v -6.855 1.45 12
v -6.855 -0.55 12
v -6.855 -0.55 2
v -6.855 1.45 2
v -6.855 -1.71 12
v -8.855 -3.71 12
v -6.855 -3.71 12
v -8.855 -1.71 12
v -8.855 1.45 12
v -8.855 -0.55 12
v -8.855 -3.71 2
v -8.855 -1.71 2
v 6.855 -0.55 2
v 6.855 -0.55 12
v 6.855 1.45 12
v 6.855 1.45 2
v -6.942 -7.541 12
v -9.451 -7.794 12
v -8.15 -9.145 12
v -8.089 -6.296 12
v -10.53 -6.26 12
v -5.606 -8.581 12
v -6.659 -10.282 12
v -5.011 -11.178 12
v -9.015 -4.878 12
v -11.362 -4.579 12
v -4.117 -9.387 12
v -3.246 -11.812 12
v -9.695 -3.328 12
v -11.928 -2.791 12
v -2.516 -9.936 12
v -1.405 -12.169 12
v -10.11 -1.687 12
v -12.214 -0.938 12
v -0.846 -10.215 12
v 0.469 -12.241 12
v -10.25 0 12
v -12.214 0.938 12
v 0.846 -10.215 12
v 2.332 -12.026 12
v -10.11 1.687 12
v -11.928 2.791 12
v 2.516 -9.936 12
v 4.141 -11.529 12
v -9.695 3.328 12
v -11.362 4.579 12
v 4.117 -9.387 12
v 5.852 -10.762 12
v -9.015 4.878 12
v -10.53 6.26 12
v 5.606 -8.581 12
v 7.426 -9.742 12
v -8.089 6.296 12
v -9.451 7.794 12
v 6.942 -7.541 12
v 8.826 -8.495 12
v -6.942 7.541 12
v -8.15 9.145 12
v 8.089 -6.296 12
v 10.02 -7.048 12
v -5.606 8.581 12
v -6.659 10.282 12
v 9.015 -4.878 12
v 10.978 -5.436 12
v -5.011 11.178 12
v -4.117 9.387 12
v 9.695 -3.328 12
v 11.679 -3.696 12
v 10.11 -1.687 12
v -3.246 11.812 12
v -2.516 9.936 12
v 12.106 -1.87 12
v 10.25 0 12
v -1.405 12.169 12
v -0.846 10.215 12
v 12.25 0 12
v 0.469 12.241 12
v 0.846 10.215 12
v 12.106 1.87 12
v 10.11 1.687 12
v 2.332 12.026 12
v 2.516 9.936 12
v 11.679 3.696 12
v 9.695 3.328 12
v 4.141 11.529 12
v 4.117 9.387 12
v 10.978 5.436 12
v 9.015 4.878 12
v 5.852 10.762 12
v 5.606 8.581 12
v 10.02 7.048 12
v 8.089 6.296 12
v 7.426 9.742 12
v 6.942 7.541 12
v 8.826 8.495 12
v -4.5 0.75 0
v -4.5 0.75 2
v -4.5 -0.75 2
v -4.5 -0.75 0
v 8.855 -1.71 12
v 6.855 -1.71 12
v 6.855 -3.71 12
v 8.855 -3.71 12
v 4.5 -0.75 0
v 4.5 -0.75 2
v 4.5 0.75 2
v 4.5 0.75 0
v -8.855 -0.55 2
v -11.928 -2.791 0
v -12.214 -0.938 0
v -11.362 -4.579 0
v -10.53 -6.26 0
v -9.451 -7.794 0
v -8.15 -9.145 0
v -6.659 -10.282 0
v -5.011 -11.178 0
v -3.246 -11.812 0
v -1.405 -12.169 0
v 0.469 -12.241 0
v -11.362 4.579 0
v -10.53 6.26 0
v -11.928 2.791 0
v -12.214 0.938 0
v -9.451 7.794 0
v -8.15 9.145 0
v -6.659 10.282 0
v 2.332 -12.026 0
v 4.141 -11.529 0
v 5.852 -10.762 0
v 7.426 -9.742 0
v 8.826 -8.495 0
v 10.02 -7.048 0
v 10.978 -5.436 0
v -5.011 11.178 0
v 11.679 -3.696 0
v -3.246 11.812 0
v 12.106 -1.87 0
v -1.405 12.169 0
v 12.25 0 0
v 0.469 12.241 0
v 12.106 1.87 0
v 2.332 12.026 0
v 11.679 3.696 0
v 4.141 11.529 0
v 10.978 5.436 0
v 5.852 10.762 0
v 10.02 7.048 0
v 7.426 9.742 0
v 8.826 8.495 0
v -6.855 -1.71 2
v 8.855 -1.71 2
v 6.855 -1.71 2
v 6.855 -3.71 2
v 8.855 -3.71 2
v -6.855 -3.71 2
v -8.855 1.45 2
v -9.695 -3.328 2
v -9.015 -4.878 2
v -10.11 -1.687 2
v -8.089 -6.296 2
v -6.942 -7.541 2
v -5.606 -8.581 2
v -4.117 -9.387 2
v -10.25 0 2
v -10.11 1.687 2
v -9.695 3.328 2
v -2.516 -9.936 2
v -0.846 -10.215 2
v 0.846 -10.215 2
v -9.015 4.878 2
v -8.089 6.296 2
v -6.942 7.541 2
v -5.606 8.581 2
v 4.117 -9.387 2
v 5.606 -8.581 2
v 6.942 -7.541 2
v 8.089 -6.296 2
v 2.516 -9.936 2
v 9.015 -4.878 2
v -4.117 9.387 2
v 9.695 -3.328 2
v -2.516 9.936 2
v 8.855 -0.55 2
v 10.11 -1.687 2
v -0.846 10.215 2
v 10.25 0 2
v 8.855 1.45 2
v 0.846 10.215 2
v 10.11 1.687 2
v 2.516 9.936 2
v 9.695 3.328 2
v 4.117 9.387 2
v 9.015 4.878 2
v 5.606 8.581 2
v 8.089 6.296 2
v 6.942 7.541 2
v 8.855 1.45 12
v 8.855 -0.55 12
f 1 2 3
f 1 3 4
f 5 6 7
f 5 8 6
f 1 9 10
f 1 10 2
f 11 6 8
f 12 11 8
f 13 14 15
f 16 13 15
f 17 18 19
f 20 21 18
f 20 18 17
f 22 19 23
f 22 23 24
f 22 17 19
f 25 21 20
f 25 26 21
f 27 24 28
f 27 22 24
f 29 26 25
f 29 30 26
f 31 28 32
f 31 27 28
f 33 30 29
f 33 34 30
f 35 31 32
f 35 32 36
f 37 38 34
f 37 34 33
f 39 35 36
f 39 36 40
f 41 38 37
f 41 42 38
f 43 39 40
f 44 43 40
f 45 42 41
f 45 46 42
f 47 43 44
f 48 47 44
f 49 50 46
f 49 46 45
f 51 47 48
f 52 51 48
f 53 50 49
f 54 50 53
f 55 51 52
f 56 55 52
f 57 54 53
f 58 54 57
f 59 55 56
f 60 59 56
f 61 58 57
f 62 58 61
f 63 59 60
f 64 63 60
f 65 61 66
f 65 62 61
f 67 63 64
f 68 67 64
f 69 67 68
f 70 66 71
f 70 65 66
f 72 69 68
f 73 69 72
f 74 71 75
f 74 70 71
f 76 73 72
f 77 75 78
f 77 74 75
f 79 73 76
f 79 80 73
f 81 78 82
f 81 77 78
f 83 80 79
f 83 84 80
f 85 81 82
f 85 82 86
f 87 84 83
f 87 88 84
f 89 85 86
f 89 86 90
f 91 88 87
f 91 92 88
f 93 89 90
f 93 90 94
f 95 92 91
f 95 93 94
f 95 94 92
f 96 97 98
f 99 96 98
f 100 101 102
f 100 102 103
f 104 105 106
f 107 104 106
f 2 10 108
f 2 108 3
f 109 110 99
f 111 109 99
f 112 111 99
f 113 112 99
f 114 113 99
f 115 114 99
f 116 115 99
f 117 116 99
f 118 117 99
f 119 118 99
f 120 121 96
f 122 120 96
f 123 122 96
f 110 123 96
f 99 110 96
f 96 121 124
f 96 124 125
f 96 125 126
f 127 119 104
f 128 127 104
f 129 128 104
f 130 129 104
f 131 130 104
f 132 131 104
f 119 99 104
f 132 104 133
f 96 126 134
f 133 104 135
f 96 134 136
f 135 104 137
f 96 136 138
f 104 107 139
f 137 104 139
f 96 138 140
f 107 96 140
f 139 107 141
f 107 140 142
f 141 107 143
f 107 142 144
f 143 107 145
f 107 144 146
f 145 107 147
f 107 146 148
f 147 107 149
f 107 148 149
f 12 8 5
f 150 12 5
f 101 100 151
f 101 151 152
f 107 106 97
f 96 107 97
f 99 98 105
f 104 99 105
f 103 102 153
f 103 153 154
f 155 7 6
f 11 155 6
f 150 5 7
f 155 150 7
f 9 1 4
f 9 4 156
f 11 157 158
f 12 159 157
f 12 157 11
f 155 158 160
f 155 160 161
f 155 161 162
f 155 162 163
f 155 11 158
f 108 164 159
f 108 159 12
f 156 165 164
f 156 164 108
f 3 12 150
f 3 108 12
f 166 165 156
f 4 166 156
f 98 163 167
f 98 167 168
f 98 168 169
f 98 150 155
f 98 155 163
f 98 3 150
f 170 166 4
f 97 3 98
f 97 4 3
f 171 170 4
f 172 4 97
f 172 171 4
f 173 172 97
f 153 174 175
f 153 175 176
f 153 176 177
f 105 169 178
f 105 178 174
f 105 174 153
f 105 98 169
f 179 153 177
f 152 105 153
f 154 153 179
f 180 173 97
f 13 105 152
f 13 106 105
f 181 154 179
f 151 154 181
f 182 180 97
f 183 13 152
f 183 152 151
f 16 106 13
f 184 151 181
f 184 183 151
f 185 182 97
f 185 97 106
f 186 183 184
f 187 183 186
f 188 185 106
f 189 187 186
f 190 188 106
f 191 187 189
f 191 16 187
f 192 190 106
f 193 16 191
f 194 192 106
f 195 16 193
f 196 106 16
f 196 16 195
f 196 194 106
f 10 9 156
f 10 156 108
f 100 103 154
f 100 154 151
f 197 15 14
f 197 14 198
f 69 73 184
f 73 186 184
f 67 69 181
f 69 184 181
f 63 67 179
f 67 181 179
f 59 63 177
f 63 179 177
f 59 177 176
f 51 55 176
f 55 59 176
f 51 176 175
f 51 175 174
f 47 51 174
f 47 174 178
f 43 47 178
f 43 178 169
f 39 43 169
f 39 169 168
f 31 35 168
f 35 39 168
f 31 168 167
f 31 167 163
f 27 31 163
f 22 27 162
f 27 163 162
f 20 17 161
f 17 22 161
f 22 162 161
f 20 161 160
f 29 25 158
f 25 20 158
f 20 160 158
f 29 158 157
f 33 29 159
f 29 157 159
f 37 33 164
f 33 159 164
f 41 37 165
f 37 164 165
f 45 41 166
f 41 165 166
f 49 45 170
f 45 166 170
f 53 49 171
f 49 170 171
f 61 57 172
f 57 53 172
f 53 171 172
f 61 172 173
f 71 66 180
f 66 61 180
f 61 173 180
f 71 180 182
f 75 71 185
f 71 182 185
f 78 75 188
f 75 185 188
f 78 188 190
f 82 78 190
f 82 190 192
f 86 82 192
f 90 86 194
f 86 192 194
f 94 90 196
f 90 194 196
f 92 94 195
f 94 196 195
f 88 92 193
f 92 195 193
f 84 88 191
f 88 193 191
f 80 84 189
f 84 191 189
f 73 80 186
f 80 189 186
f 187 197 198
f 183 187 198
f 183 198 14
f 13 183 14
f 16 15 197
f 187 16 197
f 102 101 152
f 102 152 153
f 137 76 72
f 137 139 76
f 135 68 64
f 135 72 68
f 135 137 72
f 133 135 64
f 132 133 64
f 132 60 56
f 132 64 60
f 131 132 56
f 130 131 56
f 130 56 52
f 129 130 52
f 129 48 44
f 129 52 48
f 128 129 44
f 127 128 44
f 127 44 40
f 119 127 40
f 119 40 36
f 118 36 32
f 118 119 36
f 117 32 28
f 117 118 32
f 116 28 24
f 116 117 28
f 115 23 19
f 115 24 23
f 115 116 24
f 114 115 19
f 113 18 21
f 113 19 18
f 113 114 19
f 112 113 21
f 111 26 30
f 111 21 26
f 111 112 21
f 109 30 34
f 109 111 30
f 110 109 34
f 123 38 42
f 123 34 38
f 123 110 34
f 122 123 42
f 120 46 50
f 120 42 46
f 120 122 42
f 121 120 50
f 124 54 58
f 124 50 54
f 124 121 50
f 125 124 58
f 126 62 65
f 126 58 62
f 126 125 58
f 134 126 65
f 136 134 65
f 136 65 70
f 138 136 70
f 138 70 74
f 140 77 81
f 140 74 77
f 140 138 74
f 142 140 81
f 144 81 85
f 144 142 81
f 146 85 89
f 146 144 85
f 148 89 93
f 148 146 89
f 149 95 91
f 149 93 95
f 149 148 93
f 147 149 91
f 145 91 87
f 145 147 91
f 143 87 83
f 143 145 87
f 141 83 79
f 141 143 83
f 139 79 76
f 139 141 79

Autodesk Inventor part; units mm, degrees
ref_plane "YZ Plane" through (0, 0, 0) normal (1, 0, 0) x (0, 1, 0)
ref_plane "XZ Plane" through (0, 0, 0) normal (0, 1, 0) x (-1, 0, 0)
ref_plane "XY Plane" through (0, 0, 0) normal (0, 0, 1) x (1, 0, 0)
sketch "Sketch1" plane through (0, 0, 0) normal (0, 0, 1) x (1, 0, 0)
  circle A0 centre (0, 0) radius 12.25 projected
  point P0 (0, 0)
extrude "Extrusion1" add sketch "Sketch1" along normal blind 2
sketch "Sketch2" plane through (0, 0, 2) normal (0, 0, 1) x (1, 0, 0)
  circle A0 centre (0, 0) radius 12.25 projected
  line L0 (-4.5, -0.75) -> (4.5, -0.75)
  line L1 (4.5, -0.75) -> (4.5, 0.75)
  line L2 (4.5, 0.75) -> (-4.5, 0.75)
  line L3 (-4.5, 0.75) -> (-4.5, -0.75)
  line L4 (-4.5, -0.75) -> (4.5, 0.75) construction
  line L5 (4.5, -0.75) -> (-4.5, 0.75) construction
  dimension "d13" = 9
  dimension "d14" = 1.5
extrude "Extrusion2" cut sketch "Sketch2" against normal through all contours L3 L2 L1 L0
sketch "Sketch3" plane through (0, 0, 2) normal (0, 0, 1) x (1, 0, 0)
  circle A0 centre (0, 0) radius 12.25 projected
  circle A1 centre (0, 0) radius 10.25
  dimension "d4" = 2
extrude "Extrusion3" add sketch "Sketch3" along normal blind 10
sketch "Sketch4" plane through (0, 0, 2) normal (0, 0, 1) x (1, 0, 0)
  circle A0 centre (0, 0) radius 10.25 construction
  line L0 (-5.235, -0.75) -> (-8.355, -0.75) construction
  line L1 (-5.235, -1.51) -> (-8.355, -1.51) construction
  line L2 (-8.355, -0.75) -> (-8.355, -1.51) projected
  line L3 (-8.855, -0.55) -> (-6.855, -0.55)
  line L4 (-6.855, -0.55) -> (-6.855, 1.45)
  line L5 (-6.855, 1.45) -> (-8.855, 1.45)
  line L6 (-8.855, 1.45) -> (-8.855, -0.55)
  line L7 (-8.855, -0.55) -> (-6.855, 1.45) construction
  line L8 (-6.855, -0.55) -> (-8.855, 1.45) construction
  line L9 (-8.355, -1.13) -> (-6.0393, -1.13) construction
  line L10 (-8.855, -1.71) -> (-6.855, -1.71)
  line L11 (-6.855, -1.71) -> (-6.855, -3.71)
  line L12 (-6.855, -3.71) -> (-8.855, -3.71)
  line L13 (-8.855, -3.71) -> (-8.855, -1.71)
  line L14 (-8.855, -1.71) -> (-6.855, -3.71) construction
  line L15 (-6.855, -1.71) -> (-8.855, -3.71) construction
  line L16 (0, 0) -> (0, -2.4826) construction
  line L17 (8.855, -0.55) -> (6.855, -0.55)
  line L18 (6.855, -0.55) -> (6.855, 1.45)
  line L19 (6.855, 1.45) -> (8.855, 1.45)
  line L20 (8.855, 1.45) -> (8.855, -0.55)
  line L21 (8.855, -0.55) -> (6.855, 1.45) construction
  line L22 (6.855, -0.55) -> (8.855, 1.45) construction
  line L23 (6.855, -1.71) -> (6.855, -3.71)
  line L24 (8.855, -1.71) -> (6.855, -1.71)
  line L25 (6.855, -3.71) -> (8.855, -3.71)
  line L26 (8.855, -1.71) -> (6.855, -3.71) construction
  line L27 (6.855, -1.71) -> (8.855, -3.71) construction
  line L28 (8.855, -3.71) -> (8.855, -1.71)
  point P0 (-7.855, 0.45)
  point P1 (-7.855, -2.71)
  point P2 (7.855, 0.45)
  point P3 (7.855, -2.71)
  dimension "d7" = 0.2
  dimension "d8" = 0.5
  dimension "d9" = 2
  dimension "d10" = 2
extrude "Extrusion4" add sketch "Sketch4" along normal up to surface (10 mm away)
properties part number "PI_holder"
